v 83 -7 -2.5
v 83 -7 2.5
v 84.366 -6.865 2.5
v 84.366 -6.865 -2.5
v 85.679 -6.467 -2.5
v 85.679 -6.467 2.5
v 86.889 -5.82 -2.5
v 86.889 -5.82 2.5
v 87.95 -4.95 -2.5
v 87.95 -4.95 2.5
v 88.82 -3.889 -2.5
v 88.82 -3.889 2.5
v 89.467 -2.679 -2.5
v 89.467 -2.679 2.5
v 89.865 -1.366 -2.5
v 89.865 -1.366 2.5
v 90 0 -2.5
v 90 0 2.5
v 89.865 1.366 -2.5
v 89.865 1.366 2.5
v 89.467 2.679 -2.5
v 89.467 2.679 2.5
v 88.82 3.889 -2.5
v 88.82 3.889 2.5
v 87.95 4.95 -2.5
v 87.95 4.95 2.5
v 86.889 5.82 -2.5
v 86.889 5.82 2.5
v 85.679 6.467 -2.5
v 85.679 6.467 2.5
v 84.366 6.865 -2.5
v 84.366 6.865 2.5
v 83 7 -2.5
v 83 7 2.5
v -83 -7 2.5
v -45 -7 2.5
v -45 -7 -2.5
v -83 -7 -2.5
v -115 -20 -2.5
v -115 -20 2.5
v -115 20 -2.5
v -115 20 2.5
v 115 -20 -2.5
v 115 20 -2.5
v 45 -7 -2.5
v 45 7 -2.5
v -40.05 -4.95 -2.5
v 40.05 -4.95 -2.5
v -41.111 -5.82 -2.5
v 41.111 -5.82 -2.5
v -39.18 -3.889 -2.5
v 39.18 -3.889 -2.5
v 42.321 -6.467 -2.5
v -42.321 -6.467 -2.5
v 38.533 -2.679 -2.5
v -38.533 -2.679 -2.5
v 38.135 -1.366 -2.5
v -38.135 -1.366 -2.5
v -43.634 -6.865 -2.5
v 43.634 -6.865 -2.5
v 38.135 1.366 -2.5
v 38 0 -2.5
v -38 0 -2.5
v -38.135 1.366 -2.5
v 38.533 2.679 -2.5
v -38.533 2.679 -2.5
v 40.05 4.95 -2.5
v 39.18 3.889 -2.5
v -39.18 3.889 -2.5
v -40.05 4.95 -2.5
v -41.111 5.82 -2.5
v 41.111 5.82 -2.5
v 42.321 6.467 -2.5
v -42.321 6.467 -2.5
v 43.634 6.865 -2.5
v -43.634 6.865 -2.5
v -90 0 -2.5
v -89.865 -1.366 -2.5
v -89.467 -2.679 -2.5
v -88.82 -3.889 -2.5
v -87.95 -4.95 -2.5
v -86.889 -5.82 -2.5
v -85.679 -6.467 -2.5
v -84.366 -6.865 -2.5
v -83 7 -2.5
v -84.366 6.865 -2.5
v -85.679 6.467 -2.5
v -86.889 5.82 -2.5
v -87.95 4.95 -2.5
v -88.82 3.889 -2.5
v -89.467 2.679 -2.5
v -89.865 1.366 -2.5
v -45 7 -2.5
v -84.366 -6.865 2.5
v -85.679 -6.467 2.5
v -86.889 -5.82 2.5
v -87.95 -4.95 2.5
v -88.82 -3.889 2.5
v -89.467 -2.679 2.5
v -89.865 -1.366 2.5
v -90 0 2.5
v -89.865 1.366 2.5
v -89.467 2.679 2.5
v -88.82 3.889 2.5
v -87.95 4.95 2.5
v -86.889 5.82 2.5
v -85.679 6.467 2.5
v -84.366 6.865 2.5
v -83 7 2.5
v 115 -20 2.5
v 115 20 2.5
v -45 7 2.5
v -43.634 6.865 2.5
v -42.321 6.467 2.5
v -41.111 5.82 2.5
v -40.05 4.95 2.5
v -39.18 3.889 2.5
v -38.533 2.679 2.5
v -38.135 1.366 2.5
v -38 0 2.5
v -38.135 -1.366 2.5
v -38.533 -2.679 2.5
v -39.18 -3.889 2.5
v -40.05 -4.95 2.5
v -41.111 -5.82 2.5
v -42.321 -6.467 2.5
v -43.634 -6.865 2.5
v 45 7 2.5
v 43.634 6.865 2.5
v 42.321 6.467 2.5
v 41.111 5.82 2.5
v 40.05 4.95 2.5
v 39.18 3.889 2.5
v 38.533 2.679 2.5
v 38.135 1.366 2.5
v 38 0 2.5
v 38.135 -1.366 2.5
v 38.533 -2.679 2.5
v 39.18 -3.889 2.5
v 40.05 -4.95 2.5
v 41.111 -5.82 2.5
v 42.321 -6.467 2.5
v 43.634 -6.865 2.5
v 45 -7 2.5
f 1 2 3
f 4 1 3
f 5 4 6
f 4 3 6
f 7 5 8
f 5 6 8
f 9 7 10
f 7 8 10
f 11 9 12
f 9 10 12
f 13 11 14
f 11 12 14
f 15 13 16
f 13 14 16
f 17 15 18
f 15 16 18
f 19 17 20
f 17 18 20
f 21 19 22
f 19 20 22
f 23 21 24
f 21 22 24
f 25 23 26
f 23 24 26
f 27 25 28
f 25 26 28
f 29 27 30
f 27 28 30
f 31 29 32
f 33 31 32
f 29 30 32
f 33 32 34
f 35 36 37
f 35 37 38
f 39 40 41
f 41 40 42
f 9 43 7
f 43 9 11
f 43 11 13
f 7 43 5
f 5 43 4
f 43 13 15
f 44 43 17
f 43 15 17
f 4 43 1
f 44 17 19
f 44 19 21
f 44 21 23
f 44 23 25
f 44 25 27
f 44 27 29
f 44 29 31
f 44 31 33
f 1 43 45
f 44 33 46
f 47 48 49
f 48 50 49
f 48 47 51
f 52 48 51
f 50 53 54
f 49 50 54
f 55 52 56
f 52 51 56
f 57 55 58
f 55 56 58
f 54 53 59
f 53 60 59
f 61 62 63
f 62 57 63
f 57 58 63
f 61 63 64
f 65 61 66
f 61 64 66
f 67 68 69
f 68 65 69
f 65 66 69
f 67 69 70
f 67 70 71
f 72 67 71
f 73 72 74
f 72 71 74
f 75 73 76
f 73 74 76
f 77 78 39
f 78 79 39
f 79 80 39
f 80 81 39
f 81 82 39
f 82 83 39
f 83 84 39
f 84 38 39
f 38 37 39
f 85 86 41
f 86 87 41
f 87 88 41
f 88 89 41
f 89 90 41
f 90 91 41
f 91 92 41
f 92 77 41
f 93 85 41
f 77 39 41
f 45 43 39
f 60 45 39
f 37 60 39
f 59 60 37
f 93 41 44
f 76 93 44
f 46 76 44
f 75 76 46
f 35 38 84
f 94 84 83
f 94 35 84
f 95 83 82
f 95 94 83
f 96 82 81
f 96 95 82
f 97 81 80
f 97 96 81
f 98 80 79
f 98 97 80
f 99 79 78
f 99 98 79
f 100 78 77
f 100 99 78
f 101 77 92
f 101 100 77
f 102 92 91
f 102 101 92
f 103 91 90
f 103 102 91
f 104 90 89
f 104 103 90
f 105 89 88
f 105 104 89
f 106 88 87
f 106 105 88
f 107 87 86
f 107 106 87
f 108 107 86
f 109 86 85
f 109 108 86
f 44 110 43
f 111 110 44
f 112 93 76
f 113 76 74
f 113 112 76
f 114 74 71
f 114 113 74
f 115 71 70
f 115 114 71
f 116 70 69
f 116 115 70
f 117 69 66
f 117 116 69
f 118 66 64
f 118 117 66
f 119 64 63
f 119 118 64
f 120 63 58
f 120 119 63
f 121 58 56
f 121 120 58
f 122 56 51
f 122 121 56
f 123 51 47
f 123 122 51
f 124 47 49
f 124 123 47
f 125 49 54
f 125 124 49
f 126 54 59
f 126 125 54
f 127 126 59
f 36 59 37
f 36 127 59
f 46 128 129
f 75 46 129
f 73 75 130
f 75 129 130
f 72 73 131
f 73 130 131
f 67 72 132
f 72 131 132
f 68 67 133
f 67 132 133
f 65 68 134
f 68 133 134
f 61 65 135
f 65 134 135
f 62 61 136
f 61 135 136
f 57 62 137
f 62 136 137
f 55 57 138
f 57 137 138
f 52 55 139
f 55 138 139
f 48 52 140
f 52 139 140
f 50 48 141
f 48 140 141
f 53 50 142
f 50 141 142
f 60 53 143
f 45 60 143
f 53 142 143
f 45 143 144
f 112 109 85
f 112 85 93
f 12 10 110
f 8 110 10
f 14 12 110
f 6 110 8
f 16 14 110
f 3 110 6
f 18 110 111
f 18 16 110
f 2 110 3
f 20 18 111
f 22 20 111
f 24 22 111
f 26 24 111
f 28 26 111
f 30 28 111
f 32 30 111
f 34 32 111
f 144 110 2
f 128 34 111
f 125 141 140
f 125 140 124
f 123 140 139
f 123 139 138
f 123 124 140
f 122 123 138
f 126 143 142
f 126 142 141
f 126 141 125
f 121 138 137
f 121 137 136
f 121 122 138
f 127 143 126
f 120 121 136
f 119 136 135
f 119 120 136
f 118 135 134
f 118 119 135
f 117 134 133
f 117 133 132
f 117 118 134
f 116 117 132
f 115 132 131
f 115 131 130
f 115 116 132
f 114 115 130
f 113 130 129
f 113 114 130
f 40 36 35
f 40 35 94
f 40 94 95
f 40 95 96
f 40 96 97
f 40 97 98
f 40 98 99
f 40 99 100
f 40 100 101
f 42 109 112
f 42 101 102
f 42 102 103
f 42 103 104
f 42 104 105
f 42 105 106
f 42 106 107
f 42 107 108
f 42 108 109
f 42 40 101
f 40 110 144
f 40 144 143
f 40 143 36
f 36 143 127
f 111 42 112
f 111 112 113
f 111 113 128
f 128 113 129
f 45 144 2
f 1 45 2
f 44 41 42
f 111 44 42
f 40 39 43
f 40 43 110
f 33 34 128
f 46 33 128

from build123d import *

# Parameters (mm, degrees)
PLAT_W                       = 40
PLAT_H                       = 5
EL_MENT_M_CANO_SOUD_1_DEPTH  = 230
ENL_V_MAT_EXTRU_1_DEPTH      = 3.5
ENL_V_MAT_EXTRU_1_DEPTH_BACK = 3.5


with BuildPart() as part:
    # plat → Elément mécano-soudé1 (new body)
    with BuildSketch(Plane.YZ.offset(-115)):
        Rectangle(PLAT_W, PLAT_H)
    extrude(amount=EL_MENT_M_CANO_SOUD_1_DEPTH)

    # Esquisse2 → Enlèv. mat.-Extru.1 (cut, two sides)
    with BuildSketch(Plane.XY) as enl_v_mat_extru_1_sk:
        with BuildLine():
            Line((-83, 7), (-45, 7))
            ThreePointArc((-45, 7), (-38, 0), (-45, -7))
            Line((-45, -7), (-83, -7))
            ThreePointArc((-83, -7), (-90, 0), (-83, 7))
        make_face()
        with BuildLine():
            Line((83, 7), (45, 7))
            ThreePointArc((45, 7), (38, 0), (45, -7))
            Line((45, -7), (83, -7))
            ThreePointArc((83, -7), (90, 0), (83, 7))
        make_face()
    extrude(amount=ENL_V_MAT_EXTRU_1_DEPTH, mode=Mode.SUBTRACT)
    extrude(enl_v_mat_extru_1_sk.sketch, amount=-ENL_V_MAT_EXTRU_1_DEPTH_BACK, mode=Mode.SUBTRACT)


solid = part.part
